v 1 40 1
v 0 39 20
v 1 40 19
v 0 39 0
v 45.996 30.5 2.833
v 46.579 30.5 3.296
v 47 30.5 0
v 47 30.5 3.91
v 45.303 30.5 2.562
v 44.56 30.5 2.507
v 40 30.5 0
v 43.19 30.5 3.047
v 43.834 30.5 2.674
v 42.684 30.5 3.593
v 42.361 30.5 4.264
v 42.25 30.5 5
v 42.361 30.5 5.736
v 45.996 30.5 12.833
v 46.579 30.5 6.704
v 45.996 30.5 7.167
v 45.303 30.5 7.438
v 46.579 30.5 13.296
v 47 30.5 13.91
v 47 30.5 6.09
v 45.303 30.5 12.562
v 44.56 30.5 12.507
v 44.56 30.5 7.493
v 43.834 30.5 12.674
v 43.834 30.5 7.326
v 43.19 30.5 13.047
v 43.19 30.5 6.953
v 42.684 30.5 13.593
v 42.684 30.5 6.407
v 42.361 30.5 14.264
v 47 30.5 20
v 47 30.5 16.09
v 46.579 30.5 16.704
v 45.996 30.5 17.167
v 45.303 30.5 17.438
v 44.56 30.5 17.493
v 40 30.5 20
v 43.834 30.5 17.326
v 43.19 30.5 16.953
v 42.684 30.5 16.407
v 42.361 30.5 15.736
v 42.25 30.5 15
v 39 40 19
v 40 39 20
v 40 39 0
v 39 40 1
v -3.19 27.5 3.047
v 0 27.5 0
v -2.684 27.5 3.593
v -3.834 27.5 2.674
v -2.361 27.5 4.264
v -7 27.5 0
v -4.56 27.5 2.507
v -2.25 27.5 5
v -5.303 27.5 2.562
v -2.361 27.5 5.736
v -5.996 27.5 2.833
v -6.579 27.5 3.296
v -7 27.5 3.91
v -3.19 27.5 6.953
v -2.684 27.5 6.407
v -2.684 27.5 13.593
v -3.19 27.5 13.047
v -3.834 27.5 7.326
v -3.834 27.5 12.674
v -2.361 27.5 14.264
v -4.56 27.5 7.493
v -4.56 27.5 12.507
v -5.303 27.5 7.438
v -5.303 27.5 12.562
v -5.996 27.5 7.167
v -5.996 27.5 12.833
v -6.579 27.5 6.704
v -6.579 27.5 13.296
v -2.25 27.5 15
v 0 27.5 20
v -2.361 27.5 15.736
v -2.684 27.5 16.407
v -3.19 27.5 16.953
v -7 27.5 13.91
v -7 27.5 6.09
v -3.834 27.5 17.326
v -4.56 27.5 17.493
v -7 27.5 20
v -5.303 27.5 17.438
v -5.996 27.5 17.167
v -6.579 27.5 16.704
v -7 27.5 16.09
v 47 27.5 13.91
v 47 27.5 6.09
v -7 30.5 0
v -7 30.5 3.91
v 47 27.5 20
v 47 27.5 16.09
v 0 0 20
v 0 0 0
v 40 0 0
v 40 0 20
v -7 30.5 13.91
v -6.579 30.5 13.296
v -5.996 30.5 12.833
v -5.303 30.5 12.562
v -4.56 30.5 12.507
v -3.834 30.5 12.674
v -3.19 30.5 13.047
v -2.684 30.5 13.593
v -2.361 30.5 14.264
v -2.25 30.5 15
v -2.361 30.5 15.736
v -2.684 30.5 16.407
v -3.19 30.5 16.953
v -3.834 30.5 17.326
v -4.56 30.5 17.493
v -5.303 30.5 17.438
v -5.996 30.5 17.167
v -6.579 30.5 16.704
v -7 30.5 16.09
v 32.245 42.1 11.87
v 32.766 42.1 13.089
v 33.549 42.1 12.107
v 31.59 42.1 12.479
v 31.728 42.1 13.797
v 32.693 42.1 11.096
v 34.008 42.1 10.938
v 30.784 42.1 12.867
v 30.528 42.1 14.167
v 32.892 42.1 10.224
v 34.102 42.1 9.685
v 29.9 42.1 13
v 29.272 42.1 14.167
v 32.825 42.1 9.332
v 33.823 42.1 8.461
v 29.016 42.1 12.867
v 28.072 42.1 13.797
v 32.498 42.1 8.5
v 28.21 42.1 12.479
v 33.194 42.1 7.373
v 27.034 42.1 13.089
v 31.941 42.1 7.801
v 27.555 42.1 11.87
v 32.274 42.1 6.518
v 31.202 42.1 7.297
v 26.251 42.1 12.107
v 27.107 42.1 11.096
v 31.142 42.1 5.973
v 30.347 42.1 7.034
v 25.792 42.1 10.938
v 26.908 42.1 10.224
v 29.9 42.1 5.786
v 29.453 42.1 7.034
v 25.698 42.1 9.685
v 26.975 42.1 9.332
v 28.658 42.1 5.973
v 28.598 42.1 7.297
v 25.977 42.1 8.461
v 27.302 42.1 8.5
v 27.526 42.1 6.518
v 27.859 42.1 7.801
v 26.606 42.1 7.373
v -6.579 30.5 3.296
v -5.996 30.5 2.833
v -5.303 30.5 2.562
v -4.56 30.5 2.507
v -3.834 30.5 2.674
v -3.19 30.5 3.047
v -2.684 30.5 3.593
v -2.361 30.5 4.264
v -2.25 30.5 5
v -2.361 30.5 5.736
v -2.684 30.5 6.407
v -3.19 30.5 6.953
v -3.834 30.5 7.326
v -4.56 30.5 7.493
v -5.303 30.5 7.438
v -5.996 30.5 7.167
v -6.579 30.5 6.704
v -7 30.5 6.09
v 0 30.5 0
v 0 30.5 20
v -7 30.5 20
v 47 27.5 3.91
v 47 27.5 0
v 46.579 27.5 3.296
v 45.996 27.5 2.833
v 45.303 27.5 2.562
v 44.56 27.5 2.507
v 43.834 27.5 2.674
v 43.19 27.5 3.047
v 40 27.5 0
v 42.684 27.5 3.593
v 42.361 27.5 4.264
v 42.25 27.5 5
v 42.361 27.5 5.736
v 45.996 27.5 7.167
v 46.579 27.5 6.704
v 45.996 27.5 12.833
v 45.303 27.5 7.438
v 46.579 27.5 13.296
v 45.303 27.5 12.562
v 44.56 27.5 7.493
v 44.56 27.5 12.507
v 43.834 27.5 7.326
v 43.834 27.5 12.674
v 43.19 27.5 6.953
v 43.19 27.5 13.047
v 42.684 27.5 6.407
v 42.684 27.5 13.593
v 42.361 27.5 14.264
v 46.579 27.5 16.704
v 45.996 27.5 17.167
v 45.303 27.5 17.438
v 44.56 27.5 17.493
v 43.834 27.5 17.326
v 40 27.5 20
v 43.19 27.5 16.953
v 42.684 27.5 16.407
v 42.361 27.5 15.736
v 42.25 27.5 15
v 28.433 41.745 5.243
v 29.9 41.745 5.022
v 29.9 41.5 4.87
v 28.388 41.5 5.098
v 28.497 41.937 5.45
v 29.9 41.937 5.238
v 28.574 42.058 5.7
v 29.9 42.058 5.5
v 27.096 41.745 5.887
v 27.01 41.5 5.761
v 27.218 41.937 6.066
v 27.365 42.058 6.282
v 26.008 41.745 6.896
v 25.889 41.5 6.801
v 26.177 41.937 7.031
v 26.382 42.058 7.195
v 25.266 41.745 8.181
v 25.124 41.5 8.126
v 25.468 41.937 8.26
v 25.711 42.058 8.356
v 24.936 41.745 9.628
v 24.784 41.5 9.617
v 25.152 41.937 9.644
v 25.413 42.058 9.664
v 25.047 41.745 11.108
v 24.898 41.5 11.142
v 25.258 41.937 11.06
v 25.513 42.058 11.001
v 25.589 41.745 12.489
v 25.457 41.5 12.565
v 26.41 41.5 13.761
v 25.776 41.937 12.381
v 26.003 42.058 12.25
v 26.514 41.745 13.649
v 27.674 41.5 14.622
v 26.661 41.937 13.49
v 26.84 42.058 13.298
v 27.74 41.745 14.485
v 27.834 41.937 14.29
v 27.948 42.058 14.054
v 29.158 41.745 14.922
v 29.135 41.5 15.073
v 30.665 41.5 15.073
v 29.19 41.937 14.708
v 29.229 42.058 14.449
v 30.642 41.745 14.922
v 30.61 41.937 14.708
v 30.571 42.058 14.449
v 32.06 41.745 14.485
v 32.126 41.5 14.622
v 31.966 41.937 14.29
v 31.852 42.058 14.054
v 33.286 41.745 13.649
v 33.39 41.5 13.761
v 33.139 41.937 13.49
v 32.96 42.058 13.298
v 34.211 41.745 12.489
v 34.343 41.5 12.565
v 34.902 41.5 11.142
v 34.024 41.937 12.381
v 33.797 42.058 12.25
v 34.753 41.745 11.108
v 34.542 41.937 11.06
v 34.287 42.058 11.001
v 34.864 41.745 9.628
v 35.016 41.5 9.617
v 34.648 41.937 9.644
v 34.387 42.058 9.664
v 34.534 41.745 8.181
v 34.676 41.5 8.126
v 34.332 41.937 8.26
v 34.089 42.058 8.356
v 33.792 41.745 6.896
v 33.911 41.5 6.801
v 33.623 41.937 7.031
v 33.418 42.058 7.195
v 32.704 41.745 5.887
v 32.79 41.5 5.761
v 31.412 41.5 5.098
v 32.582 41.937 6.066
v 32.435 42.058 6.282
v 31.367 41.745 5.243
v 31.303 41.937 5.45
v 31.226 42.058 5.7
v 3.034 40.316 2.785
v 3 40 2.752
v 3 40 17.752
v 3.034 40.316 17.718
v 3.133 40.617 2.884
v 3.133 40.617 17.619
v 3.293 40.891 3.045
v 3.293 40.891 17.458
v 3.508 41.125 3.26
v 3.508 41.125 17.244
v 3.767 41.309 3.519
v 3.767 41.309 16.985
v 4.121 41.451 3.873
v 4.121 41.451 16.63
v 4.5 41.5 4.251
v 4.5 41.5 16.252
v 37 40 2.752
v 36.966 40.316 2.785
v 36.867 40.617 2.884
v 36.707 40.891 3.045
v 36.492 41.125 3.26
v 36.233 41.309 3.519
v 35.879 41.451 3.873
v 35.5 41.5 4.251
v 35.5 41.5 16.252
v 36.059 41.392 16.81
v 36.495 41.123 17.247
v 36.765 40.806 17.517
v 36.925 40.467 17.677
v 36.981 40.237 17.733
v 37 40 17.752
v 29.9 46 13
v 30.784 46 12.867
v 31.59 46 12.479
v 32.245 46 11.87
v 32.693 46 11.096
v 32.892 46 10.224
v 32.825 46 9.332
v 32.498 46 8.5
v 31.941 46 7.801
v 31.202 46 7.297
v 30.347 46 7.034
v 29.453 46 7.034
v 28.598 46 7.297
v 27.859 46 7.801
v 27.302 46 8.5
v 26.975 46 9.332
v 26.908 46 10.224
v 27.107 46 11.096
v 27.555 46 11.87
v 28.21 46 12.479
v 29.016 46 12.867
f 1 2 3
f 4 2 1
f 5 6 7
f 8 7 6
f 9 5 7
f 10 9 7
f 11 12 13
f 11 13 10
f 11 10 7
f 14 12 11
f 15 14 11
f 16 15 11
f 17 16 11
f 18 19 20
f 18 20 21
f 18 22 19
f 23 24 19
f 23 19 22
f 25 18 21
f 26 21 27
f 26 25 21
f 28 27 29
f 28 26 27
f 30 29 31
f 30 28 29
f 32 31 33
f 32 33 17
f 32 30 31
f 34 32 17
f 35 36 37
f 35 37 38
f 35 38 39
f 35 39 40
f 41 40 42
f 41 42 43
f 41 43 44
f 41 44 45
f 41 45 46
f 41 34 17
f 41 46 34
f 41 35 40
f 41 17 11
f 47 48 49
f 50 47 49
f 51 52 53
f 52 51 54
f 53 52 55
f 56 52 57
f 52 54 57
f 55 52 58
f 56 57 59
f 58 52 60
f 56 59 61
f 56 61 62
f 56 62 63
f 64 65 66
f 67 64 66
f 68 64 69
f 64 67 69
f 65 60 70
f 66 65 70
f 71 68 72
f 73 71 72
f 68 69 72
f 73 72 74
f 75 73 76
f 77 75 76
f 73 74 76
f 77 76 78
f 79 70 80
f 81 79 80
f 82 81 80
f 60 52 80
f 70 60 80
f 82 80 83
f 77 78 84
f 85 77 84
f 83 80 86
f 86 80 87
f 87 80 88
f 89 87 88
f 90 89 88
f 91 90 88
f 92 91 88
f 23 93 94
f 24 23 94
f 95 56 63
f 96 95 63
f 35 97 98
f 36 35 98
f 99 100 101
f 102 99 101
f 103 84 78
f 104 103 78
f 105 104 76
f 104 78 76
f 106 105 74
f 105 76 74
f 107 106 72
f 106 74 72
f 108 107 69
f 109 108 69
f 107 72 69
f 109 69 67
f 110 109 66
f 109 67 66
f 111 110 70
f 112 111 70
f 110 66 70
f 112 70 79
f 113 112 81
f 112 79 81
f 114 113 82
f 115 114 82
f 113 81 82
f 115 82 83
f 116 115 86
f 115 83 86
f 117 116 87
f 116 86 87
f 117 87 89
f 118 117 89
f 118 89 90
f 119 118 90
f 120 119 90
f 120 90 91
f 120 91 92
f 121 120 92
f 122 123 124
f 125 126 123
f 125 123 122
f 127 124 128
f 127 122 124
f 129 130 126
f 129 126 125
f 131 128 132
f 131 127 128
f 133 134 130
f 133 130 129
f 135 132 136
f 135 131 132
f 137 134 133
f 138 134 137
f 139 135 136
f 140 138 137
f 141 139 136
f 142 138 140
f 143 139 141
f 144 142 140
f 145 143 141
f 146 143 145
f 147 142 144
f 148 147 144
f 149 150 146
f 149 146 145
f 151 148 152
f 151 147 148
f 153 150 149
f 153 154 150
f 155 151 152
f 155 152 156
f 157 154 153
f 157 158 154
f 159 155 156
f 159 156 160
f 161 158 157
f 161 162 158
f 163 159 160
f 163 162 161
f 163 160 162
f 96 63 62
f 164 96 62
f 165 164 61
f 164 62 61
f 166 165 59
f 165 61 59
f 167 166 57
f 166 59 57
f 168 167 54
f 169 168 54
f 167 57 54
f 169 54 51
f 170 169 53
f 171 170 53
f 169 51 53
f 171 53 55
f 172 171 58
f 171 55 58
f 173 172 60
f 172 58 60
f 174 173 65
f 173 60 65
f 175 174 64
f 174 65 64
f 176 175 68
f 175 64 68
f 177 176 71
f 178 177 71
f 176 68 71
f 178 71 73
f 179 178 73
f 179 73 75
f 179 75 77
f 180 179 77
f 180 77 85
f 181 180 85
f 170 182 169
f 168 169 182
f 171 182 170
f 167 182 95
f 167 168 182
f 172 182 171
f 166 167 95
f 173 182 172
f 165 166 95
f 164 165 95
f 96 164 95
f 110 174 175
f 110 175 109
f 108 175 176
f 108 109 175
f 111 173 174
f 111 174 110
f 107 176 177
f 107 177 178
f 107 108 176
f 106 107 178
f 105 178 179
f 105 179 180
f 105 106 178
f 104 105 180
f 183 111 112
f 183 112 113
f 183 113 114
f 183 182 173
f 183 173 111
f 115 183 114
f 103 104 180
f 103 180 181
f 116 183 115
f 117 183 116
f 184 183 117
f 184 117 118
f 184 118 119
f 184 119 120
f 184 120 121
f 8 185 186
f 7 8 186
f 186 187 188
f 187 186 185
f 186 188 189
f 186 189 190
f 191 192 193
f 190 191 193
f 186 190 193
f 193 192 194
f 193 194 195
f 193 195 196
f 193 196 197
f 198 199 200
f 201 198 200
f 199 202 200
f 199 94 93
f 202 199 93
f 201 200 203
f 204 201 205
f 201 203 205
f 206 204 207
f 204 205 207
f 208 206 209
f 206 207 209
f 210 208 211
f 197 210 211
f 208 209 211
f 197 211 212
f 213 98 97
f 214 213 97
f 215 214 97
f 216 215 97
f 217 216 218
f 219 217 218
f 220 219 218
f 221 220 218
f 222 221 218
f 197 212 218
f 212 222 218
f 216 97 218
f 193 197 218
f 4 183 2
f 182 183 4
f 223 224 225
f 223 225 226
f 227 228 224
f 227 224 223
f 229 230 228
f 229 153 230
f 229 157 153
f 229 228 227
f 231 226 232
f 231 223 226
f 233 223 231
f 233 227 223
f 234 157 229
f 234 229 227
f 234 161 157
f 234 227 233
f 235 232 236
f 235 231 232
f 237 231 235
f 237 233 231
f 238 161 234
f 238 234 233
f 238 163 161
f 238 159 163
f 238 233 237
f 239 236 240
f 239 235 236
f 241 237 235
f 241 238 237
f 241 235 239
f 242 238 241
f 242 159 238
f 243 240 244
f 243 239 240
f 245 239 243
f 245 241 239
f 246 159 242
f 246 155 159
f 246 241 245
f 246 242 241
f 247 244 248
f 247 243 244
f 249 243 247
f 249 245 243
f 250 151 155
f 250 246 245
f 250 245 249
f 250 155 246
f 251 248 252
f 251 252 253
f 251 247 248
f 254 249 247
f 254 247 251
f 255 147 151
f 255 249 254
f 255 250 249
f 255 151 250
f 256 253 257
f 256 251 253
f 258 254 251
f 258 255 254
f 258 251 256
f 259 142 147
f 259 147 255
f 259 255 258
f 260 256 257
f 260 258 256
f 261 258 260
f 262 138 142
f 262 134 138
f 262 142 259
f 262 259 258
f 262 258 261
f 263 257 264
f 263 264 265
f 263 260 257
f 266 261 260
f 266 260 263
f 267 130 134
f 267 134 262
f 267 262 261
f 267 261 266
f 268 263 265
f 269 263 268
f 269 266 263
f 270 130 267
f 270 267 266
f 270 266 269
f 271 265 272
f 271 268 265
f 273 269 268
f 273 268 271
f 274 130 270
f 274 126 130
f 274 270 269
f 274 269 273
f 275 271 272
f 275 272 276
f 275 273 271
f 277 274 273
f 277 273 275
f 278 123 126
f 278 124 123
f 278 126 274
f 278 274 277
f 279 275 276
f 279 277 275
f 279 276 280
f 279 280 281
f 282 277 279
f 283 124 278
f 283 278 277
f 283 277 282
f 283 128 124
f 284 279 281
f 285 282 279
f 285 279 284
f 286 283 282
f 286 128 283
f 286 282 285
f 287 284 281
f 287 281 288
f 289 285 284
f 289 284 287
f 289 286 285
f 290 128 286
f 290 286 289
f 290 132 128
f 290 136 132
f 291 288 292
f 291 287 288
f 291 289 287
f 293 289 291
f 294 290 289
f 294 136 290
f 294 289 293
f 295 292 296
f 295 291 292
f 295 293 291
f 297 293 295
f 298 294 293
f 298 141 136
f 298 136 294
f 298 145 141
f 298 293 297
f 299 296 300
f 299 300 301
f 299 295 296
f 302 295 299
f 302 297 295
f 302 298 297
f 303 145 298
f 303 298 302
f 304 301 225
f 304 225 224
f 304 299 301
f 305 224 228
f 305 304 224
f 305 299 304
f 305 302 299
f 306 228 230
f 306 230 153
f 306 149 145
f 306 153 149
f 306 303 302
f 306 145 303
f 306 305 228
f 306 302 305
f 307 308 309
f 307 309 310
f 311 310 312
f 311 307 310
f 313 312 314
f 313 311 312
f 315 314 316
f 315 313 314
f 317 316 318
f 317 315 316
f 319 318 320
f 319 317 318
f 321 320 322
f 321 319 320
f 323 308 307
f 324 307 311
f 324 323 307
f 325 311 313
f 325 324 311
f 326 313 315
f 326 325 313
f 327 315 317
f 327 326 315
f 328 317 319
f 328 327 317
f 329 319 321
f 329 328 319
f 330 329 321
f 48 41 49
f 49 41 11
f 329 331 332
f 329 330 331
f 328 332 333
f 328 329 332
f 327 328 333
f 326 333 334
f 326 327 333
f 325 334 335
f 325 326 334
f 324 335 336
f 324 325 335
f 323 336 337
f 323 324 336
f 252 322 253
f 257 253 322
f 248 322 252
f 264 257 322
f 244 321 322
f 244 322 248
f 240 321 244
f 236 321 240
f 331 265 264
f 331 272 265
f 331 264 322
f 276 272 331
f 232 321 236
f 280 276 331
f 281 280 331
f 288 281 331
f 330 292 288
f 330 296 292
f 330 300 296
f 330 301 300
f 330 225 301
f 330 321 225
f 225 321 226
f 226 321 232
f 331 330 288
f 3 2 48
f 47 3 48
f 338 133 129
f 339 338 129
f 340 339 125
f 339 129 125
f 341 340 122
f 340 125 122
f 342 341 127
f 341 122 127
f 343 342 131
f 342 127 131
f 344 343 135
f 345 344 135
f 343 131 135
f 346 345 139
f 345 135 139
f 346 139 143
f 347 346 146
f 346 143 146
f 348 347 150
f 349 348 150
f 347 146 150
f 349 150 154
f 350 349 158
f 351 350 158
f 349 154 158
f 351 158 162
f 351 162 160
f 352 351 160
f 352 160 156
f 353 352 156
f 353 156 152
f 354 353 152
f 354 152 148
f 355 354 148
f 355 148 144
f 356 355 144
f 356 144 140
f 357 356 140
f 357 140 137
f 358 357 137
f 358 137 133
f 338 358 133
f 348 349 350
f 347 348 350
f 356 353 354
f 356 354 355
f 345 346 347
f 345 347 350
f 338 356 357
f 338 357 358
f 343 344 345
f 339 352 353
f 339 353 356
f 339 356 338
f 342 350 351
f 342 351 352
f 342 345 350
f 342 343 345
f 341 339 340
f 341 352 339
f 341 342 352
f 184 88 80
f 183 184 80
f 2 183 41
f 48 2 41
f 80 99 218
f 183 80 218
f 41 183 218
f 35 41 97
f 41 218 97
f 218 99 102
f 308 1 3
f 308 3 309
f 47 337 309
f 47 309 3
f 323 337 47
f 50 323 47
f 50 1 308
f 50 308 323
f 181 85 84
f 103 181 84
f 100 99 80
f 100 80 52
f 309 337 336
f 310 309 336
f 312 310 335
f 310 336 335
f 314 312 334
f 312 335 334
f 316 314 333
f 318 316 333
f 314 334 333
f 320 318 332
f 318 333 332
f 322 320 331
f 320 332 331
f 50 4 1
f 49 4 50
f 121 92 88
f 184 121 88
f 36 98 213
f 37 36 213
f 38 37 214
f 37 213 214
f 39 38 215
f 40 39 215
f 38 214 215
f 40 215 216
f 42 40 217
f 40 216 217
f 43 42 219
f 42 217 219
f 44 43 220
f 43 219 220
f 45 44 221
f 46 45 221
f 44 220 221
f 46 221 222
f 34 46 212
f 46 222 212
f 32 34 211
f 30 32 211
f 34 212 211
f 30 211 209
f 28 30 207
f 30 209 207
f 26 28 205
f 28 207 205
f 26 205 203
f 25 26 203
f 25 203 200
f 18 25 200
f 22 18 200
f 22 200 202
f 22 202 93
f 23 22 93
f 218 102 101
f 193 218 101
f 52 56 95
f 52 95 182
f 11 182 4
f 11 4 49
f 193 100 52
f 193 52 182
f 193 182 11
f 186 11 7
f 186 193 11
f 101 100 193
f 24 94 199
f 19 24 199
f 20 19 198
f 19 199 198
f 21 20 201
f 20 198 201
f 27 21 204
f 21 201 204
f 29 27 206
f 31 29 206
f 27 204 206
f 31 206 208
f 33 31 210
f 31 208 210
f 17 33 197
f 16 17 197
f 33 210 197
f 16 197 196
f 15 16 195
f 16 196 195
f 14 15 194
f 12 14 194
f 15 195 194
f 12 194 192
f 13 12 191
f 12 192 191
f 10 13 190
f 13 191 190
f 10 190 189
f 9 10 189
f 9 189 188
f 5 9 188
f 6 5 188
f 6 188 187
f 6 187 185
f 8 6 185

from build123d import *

# Parameters (mm, degrees)
SKETCH_1_W      = 40
SKETCH_1_H      = 20
EXTRUDE_1_DEPTH = 40
EXTRUDE_START   = -27.5
EXTRUDE_4_DEPTH = 3
SKETCH_2_R      = 3
EXTRUDE_5_DEPTH = 6
SKETCH_8_W      = 34
SKETCH_8_H      = 15
EXTRUDE_6_DEPTH = 1.5
FILLET_1_R      = 1.5
SKETCH_9_R      = 5.130323695
EXTRUDE_7_DEPTH = 0.6
FILLET_2_R      = 1
CHAMFER_1_SIZE  = 1


# Some blends are built 0.0001 mm under size
with BuildPart() as part:
    # 草图1 → 凸台-拉伸1 (new body)
    with BuildSketch(Plane(origin=(0, 0, 0), x_dir=(1, 0, 0), z_dir=(0, 1, 0))):
        with Locations((20, -10)):
            Rectangle(SKETCH_1_W, SKETCH_1_H)
    extrude(amount=EXTRUDE_1_DEPTH)

    # 草图7 → 凸台-拉伸4 (add)
    with BuildSketch(Plane.XZ.offset(EXTRUDE_START)):
        with BuildLine():
            Line((40, 20), (47, 20))
            Line((47, 20), (47, 16.089724736))
            ThreePointArc((47, 16.089724736), (42.25, 15), (47, 13.910275264))
            Line((47, 13.910275264), (47, 6.089724736))
            ThreePointArc((47, 6.089724736), (42.25, 5), (47, 3.910275264))
            Line((47, 3.910275264), (47, 0))
            Line((47, 0), (40, 0))
            Line((40, 0), (40, 20))
        make_face()
        with BuildLine():
            Line((0, 20), (0, 0))
            Line((0, 0), (-7, 0))
            Line((-7, 0), (-7, 3.910275264))
            ThreePointArc((-7, 3.910275264), (-2.25, 5), (-7, 6.089724736))
            Line((-7, 6.089724736), (-7, 13.910275264))
            ThreePointArc((-7, 13.910275264), (-2.25, 15), (-7, 16.089724736))
            Line((-7, 16.089724736), (-7, 20))
            Line((-7, 20), (0, 20))
        make_face()
    extrude(amount=-EXTRUDE_4_DEPTH)

    # 草图2 → 凸台-拉伸5 (add)
    with BuildSketch(Plane(origin=(0, 40, 0), x_dir=(1, 0, 0), z_dir=(0, 1, 0))):
        with Locations(Location((29.9, -10, 0), (0, 0, 270))):
            Circle(SKETCH_2_R)
    extrude(amount=EXTRUDE_5_DEPTH)

    # 草图8 → 凸台-拉伸6 (add)
    with BuildSketch(Plane(origin=(0, 40, 0), x_dir=(1, 0, 0), z_dir=(0, 1, 0))):
        with Locations((20, -10.251596062)):
            Rectangle(SKETCH_8_W, SKETCH_8_H)
    extrude(amount=EXTRUDE_6_DEPTH)

    # 圆角1
    fillet_1_edges = [part.edges().sort_by_distance(p)[0] for p in [
        (20, 41.5, 2.751596062),
        (37, 41.5, 10.251596062),
        (20, 41.5, 17.751596062),
        (3, 41.5, 10.251596062),
    ]]
    fillet(fillet_1_edges, radius=FILLET_1_R - 0.0001)  # a hair under: the kernel refuses the full size

    # 草图9 → 凸台-拉伸7 (add)
    with BuildSketch(Plane(origin=(0, 41.5, 0), x_dir=(1, 0, 0), z_dir=(0, 1, 0))):
        with Locations(Location((29.9, -10, 0), (0, 0, 90))):
            Circle(SKETCH_9_R)
    extrude(amount=EXTRUDE_7_DEPTH)

    # 圆角2
    # the kernel refuses this fillet: 1 mm, written as the material it takes off along each edge
    with BuildSketch(Plane(origin=(29.9, 42.1, 10), x_dir=(0, 0, -1), z_dir=(1, 0, 0))) as fillet_2_piece_1:
        with BuildLine():
            CenterArc((4.213808556, -1), FILLET_2_R, 23.578178478, 66.421821522)
            Line((4.213808556, 0), (4.213808556, 0.02))
            Line((4.213808556, 0.02), (5.130323695, 0.02))
            Line((5.130323695, 0.02), (5.150323695, 0))
            ThreePointArc((5.150323695, 0), (5.150323695, -0.3), (5.148653998, -0.592))
            Line((5.148653998, -0.592), (5.130323695, -0.6))
        make_face()
    revolve(axis=Axis((29.9, 42.1, 10), (0, 1, 0)), mode=Mode.SUBTRACT)

    # 倒角1
    chamfer_1_edges = [part.edges().sort_by_distance(p)[0] for p in [
        (40, 40, 10),
        (20, 40, 0),
        (0, 40, 10),
        (20, 40, 20),
    ]]
    chamfer(chamfer_1_edges, length=CHAMFER_1_SIZE)


solid = part.part
